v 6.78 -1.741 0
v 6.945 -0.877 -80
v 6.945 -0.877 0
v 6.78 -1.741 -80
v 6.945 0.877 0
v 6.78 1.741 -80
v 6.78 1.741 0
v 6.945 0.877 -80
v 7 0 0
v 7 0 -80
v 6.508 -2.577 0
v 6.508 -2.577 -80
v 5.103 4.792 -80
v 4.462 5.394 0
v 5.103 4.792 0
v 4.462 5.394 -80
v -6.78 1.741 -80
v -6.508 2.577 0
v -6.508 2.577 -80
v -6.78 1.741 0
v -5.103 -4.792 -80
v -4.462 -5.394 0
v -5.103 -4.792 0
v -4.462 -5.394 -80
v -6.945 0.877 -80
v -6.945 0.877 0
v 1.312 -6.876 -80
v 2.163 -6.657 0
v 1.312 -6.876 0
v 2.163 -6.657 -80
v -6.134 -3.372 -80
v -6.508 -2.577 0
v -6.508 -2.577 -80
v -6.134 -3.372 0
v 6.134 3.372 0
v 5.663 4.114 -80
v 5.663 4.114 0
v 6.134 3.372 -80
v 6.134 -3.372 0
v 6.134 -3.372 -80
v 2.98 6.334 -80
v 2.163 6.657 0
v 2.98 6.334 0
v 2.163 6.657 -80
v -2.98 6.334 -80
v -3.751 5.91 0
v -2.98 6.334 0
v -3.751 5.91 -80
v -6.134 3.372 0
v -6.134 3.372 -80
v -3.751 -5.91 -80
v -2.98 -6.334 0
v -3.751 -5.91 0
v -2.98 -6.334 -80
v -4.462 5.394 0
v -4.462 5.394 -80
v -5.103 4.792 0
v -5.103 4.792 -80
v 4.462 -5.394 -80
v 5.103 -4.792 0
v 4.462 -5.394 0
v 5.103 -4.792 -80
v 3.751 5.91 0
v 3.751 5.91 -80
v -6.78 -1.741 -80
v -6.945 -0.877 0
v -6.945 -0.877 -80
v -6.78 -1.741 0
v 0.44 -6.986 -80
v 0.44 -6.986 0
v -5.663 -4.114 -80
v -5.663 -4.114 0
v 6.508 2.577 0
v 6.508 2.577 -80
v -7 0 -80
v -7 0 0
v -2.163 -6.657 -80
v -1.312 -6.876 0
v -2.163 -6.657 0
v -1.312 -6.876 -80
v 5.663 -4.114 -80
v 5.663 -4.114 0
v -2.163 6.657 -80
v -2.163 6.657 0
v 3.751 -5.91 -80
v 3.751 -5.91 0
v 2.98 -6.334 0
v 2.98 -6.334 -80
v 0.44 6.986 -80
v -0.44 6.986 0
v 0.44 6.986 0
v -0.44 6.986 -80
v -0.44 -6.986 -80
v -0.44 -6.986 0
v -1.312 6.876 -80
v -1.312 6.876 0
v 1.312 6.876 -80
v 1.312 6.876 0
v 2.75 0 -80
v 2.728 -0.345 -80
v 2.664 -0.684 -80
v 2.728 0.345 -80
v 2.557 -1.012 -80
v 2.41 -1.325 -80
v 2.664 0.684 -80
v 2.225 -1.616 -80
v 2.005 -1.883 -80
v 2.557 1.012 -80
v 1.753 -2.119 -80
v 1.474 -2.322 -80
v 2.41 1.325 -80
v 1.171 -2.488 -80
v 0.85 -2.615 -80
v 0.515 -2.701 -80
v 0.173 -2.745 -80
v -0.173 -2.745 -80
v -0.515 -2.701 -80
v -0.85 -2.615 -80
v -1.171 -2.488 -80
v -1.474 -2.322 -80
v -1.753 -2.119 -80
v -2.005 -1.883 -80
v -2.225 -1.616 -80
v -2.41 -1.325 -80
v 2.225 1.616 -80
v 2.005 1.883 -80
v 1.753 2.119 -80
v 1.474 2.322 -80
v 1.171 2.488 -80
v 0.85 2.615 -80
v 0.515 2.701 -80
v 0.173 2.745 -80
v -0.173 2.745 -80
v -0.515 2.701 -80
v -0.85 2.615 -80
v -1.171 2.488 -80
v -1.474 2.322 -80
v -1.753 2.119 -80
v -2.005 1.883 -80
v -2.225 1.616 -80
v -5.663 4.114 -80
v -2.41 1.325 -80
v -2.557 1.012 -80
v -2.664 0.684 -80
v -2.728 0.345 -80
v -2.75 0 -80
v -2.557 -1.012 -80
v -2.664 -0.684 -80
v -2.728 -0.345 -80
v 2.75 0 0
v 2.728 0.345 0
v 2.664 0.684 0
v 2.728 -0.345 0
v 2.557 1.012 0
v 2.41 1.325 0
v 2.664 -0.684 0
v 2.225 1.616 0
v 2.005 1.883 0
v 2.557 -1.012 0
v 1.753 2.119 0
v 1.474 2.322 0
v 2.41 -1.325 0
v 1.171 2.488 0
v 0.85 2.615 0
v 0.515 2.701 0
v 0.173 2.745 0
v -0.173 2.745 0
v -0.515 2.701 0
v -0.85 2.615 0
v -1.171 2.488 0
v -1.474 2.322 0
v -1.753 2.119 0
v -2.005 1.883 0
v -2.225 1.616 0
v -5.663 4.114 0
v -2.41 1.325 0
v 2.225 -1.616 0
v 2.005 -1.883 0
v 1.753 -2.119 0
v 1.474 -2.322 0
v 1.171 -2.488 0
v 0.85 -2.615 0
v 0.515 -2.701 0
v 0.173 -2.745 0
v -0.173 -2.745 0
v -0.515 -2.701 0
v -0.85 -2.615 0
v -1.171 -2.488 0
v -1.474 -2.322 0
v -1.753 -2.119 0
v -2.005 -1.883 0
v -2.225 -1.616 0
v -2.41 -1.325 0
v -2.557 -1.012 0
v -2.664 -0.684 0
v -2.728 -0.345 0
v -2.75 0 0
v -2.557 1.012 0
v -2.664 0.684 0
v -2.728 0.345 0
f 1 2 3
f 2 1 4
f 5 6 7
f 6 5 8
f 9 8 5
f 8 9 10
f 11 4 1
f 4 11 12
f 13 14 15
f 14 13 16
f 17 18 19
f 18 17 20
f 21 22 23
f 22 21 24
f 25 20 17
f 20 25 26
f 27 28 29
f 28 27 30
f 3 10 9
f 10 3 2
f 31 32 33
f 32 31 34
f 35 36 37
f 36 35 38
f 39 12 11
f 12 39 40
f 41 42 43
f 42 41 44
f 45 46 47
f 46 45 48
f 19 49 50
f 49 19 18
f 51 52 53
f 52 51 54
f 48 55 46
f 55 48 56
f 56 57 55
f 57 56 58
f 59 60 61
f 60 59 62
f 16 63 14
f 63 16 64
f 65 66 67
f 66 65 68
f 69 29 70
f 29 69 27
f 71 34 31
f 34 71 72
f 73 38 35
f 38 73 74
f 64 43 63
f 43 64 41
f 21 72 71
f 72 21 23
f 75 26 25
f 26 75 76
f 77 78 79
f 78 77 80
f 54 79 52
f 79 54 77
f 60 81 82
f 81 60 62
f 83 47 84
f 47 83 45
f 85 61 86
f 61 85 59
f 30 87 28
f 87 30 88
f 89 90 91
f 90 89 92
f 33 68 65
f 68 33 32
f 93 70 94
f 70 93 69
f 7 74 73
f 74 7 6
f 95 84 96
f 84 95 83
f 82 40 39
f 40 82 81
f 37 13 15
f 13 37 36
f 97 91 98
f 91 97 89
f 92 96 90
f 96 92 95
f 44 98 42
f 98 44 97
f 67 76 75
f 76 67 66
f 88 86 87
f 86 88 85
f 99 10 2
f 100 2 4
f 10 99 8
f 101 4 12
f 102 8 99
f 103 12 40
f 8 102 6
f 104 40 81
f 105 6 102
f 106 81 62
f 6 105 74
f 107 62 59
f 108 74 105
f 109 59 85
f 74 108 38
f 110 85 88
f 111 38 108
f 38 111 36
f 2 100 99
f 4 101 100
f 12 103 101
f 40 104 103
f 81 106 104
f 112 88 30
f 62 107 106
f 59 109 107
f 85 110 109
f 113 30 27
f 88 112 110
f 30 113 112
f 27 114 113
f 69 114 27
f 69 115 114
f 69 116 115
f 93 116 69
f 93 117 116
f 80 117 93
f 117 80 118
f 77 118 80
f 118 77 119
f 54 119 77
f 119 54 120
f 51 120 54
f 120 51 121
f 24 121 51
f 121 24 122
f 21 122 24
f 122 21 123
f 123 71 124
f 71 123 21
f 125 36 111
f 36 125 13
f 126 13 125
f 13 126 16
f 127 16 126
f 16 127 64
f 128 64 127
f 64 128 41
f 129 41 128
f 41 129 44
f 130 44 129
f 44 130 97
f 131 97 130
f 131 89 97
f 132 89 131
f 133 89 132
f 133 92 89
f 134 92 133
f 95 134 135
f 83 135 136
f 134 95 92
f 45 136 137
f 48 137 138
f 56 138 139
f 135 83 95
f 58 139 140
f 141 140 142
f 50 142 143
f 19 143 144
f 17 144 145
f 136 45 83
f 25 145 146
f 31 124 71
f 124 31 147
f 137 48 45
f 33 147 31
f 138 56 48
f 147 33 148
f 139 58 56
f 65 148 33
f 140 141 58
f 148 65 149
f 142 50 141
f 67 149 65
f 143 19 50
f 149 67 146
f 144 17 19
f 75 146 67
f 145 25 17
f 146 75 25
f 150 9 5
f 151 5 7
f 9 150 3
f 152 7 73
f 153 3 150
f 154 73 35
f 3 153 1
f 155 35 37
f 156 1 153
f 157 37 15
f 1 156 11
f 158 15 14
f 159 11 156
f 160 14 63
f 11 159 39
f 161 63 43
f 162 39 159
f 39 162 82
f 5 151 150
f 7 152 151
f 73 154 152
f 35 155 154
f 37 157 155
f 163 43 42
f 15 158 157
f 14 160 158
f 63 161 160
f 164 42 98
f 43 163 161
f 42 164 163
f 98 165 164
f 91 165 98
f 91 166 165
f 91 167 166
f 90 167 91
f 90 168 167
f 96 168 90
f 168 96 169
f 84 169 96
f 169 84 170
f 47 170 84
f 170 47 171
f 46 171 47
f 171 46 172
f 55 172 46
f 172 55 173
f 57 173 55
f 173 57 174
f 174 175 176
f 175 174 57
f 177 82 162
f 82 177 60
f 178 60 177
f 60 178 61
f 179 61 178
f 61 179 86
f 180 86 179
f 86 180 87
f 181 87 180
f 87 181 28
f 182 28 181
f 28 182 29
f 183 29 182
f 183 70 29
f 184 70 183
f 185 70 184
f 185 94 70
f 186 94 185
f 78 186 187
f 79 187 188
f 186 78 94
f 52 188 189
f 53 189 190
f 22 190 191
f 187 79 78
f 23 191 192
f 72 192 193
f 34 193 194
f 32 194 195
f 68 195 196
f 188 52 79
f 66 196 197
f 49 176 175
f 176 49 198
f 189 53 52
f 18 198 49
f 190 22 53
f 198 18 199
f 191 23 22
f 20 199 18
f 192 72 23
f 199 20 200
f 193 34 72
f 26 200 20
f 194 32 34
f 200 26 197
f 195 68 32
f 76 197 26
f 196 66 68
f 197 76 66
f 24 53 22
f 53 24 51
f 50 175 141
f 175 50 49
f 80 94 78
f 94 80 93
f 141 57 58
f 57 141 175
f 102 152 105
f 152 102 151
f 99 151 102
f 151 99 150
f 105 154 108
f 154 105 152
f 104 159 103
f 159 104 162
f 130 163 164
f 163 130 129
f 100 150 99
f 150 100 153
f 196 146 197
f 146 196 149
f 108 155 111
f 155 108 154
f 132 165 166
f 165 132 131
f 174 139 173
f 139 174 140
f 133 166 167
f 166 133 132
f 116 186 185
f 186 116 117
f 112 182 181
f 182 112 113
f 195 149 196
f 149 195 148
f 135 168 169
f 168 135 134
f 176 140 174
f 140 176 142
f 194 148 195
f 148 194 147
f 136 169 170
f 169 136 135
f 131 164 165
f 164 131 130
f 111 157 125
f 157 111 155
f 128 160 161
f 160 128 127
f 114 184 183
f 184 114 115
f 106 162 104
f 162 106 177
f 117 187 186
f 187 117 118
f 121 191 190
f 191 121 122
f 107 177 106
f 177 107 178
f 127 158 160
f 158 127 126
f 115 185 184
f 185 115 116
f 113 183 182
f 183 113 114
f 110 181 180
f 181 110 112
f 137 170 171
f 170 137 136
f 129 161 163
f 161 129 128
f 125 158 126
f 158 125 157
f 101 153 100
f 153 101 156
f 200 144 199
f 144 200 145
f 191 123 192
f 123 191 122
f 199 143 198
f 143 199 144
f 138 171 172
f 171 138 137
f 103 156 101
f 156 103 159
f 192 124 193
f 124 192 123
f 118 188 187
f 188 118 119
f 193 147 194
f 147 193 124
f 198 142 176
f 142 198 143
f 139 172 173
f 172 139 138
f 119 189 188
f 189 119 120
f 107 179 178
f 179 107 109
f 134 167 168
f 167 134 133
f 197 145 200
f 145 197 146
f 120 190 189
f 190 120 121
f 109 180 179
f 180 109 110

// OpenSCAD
$fn = 50;


difference() {
	union() {
		translate(v = [0, 0, -80.0000000000]) {
			cylinder(h = 80, r = 7.0000000000);
		}
		cylinder(h = 0, r = 13.0000000000);
	}
	union() {
		#translate(v = [0, 0, -80]) {
			cylinder(h = 80, r = 2.7500000000);
		}
	}
}
